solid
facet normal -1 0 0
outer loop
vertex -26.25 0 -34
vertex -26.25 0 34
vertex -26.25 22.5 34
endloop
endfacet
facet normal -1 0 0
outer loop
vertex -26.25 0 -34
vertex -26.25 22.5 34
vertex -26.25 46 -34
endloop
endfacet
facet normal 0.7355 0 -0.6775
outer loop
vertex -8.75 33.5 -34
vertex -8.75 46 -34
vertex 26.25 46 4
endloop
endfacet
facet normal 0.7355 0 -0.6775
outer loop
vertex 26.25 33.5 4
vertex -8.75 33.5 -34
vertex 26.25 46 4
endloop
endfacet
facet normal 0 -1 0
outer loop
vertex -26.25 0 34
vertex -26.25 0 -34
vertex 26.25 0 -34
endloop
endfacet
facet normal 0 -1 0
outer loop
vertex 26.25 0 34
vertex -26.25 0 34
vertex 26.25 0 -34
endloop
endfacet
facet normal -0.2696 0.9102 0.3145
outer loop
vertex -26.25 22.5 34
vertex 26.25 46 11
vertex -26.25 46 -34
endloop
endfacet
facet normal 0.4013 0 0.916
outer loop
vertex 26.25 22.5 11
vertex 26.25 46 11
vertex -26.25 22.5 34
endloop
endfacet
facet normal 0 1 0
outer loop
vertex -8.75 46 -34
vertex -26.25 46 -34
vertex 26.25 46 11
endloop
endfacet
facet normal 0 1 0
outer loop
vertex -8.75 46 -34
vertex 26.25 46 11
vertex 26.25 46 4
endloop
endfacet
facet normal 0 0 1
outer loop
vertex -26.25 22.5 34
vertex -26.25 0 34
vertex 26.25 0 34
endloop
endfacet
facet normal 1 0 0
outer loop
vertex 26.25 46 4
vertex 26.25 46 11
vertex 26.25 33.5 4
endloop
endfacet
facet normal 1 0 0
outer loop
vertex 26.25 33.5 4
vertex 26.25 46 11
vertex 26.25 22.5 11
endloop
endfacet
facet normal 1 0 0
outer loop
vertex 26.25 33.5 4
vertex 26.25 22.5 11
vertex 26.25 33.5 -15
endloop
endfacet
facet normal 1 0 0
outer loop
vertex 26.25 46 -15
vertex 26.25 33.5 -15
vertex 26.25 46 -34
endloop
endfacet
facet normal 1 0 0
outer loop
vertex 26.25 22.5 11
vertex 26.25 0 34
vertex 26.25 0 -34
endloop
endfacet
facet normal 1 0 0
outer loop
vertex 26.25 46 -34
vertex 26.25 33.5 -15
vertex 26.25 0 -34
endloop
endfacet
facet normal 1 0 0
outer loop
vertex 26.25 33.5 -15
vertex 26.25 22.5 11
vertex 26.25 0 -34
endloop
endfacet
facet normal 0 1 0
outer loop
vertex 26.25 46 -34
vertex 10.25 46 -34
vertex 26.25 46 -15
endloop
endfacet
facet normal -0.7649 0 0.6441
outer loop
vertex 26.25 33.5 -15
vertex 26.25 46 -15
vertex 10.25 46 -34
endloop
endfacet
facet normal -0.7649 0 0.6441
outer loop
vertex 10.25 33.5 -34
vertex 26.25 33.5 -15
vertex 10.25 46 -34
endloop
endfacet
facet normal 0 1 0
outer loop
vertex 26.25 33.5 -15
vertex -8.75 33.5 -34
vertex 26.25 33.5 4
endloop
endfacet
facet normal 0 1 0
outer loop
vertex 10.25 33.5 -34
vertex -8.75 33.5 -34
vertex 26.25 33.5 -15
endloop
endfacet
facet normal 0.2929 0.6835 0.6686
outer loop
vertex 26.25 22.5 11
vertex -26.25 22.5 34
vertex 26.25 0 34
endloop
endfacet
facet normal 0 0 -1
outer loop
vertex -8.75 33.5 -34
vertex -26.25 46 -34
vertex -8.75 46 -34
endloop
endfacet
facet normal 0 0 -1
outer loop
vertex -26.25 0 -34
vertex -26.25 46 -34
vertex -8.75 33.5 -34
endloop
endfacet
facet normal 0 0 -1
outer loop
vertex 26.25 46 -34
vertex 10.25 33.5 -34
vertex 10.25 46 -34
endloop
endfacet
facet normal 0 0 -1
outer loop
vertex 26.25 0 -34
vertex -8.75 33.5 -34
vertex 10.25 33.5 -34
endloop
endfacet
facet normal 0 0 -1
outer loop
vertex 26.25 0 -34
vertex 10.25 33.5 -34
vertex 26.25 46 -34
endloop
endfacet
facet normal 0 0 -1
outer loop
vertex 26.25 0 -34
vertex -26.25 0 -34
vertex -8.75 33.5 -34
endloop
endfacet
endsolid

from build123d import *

# Parameters (mm, degrees)
SKETCH1_W           = 52.5
SKETCH1_H           = 68
BOSS_EXTRUDE1_DEPTH = 46
CUT_EXTRUDE1_DEPTH  = 12.5
CUT_EXTRUDE2_DEPTH  = 23.5
CUT_EXTRUDE3_REACH  = 71.46
CUT_EXTRUDE4_REACH  = 70.32


with BuildPart() as part:
    # Sketch1 → Boss-Extrude1 (new body)
    with BuildSketch(Plane(origin=(0, 0, 0), x_dir=(1, 0, 0), z_dir=(0, 1, 0))):
        Rectangle(SKETCH1_W, SKETCH1_H)
    extrude(amount=BOSS_EXTRUDE1_DEPTH)

    # Sketch2 → Cut-Extrude1 (cut)
    with BuildSketch(Plane(origin=(0, 46, 0), x_dir=(1, 0, 0), z_dir=(0, 1, 0))):
        Polygon((26.25, 15), (10.25, 34), (-8.75, 34), (26.25, -4), align=None)
    extrude(amount=-CUT_EXTRUDE1_DEPTH, mode=Mode.SUBTRACT)

    # Sketch2<3> → Cut-Extrude2 (cut)
    with BuildSketch(Plane(origin=(0, 46, 0), x_dir=(1, 0, 0), z_dir=(0, 1, 0))):
        Polygon((26.25, -34), (26.25, -11), (-26.25, -34), align=None)
    extrude(amount=-CUT_EXTRUDE2_DEPTH, mode=Mode.SUBTRACT)

    # Sketch3 → Cut-Extrude3 (cut, up to next)
    with BuildSketch(Plane(origin=(8.911278514, 20.792983199, 20.340961825), x_dir=(0.9561370461072578, -0.2093889663879971, -0.2048370323360841), z_dir=(0.29291969729140394, 0.6834792936799428, 0.6686210481651613)), mode=Mode.PRIVATE) as cut_extrude3_sk1:
        Polygon((18.134138361, 7.870944216), (-36.774308303, -8.570238372), (18.134138361, -24.30435687), align=None)
    cut_extrude3_tool1 = extrude(cut_extrude3_sk1.sketch, amount=CUT_EXTRUDE3_REACH, mode=Mode.PRIVATE) & part.part
    add(cut_extrude3_tool1.solids().sort_by_distance((8.75, 15, 26.333333))[0], mode=Mode.SUBTRACT)

    # Sketch4 → Cut-Extrude4 (cut, up to next)
    with BuildSketch(Plane(origin=(-10.312326736, 34.813244868, 12.031047859), x_dir=(-0.962971205375164, -0.2548167914482237, -0.08806168527990085), z_dir=(0.2696042611278684, -0.9101533921763496, -0.31453830464917976)), mode=Mode.PRIVATE) as cut_extrude4_sk1:
        Polygon((16.550519034, 47.160265119), (-37.968245086, 4.628461033), (16.550519034, -24.785895306), align=None)
    cut_extrude4_tool1 = extrude(cut_extrude4_sk1.sketch, amount=-CUT_EXTRUDE4_REACH, mode=Mode.PRIVATE) & part.part
    add(cut_extrude4_tool1.solids().sort_by_distance((-8.75, 38.166667, 3.666667))[0], mode=Mode.SUBTRACT)


solid = part.part
